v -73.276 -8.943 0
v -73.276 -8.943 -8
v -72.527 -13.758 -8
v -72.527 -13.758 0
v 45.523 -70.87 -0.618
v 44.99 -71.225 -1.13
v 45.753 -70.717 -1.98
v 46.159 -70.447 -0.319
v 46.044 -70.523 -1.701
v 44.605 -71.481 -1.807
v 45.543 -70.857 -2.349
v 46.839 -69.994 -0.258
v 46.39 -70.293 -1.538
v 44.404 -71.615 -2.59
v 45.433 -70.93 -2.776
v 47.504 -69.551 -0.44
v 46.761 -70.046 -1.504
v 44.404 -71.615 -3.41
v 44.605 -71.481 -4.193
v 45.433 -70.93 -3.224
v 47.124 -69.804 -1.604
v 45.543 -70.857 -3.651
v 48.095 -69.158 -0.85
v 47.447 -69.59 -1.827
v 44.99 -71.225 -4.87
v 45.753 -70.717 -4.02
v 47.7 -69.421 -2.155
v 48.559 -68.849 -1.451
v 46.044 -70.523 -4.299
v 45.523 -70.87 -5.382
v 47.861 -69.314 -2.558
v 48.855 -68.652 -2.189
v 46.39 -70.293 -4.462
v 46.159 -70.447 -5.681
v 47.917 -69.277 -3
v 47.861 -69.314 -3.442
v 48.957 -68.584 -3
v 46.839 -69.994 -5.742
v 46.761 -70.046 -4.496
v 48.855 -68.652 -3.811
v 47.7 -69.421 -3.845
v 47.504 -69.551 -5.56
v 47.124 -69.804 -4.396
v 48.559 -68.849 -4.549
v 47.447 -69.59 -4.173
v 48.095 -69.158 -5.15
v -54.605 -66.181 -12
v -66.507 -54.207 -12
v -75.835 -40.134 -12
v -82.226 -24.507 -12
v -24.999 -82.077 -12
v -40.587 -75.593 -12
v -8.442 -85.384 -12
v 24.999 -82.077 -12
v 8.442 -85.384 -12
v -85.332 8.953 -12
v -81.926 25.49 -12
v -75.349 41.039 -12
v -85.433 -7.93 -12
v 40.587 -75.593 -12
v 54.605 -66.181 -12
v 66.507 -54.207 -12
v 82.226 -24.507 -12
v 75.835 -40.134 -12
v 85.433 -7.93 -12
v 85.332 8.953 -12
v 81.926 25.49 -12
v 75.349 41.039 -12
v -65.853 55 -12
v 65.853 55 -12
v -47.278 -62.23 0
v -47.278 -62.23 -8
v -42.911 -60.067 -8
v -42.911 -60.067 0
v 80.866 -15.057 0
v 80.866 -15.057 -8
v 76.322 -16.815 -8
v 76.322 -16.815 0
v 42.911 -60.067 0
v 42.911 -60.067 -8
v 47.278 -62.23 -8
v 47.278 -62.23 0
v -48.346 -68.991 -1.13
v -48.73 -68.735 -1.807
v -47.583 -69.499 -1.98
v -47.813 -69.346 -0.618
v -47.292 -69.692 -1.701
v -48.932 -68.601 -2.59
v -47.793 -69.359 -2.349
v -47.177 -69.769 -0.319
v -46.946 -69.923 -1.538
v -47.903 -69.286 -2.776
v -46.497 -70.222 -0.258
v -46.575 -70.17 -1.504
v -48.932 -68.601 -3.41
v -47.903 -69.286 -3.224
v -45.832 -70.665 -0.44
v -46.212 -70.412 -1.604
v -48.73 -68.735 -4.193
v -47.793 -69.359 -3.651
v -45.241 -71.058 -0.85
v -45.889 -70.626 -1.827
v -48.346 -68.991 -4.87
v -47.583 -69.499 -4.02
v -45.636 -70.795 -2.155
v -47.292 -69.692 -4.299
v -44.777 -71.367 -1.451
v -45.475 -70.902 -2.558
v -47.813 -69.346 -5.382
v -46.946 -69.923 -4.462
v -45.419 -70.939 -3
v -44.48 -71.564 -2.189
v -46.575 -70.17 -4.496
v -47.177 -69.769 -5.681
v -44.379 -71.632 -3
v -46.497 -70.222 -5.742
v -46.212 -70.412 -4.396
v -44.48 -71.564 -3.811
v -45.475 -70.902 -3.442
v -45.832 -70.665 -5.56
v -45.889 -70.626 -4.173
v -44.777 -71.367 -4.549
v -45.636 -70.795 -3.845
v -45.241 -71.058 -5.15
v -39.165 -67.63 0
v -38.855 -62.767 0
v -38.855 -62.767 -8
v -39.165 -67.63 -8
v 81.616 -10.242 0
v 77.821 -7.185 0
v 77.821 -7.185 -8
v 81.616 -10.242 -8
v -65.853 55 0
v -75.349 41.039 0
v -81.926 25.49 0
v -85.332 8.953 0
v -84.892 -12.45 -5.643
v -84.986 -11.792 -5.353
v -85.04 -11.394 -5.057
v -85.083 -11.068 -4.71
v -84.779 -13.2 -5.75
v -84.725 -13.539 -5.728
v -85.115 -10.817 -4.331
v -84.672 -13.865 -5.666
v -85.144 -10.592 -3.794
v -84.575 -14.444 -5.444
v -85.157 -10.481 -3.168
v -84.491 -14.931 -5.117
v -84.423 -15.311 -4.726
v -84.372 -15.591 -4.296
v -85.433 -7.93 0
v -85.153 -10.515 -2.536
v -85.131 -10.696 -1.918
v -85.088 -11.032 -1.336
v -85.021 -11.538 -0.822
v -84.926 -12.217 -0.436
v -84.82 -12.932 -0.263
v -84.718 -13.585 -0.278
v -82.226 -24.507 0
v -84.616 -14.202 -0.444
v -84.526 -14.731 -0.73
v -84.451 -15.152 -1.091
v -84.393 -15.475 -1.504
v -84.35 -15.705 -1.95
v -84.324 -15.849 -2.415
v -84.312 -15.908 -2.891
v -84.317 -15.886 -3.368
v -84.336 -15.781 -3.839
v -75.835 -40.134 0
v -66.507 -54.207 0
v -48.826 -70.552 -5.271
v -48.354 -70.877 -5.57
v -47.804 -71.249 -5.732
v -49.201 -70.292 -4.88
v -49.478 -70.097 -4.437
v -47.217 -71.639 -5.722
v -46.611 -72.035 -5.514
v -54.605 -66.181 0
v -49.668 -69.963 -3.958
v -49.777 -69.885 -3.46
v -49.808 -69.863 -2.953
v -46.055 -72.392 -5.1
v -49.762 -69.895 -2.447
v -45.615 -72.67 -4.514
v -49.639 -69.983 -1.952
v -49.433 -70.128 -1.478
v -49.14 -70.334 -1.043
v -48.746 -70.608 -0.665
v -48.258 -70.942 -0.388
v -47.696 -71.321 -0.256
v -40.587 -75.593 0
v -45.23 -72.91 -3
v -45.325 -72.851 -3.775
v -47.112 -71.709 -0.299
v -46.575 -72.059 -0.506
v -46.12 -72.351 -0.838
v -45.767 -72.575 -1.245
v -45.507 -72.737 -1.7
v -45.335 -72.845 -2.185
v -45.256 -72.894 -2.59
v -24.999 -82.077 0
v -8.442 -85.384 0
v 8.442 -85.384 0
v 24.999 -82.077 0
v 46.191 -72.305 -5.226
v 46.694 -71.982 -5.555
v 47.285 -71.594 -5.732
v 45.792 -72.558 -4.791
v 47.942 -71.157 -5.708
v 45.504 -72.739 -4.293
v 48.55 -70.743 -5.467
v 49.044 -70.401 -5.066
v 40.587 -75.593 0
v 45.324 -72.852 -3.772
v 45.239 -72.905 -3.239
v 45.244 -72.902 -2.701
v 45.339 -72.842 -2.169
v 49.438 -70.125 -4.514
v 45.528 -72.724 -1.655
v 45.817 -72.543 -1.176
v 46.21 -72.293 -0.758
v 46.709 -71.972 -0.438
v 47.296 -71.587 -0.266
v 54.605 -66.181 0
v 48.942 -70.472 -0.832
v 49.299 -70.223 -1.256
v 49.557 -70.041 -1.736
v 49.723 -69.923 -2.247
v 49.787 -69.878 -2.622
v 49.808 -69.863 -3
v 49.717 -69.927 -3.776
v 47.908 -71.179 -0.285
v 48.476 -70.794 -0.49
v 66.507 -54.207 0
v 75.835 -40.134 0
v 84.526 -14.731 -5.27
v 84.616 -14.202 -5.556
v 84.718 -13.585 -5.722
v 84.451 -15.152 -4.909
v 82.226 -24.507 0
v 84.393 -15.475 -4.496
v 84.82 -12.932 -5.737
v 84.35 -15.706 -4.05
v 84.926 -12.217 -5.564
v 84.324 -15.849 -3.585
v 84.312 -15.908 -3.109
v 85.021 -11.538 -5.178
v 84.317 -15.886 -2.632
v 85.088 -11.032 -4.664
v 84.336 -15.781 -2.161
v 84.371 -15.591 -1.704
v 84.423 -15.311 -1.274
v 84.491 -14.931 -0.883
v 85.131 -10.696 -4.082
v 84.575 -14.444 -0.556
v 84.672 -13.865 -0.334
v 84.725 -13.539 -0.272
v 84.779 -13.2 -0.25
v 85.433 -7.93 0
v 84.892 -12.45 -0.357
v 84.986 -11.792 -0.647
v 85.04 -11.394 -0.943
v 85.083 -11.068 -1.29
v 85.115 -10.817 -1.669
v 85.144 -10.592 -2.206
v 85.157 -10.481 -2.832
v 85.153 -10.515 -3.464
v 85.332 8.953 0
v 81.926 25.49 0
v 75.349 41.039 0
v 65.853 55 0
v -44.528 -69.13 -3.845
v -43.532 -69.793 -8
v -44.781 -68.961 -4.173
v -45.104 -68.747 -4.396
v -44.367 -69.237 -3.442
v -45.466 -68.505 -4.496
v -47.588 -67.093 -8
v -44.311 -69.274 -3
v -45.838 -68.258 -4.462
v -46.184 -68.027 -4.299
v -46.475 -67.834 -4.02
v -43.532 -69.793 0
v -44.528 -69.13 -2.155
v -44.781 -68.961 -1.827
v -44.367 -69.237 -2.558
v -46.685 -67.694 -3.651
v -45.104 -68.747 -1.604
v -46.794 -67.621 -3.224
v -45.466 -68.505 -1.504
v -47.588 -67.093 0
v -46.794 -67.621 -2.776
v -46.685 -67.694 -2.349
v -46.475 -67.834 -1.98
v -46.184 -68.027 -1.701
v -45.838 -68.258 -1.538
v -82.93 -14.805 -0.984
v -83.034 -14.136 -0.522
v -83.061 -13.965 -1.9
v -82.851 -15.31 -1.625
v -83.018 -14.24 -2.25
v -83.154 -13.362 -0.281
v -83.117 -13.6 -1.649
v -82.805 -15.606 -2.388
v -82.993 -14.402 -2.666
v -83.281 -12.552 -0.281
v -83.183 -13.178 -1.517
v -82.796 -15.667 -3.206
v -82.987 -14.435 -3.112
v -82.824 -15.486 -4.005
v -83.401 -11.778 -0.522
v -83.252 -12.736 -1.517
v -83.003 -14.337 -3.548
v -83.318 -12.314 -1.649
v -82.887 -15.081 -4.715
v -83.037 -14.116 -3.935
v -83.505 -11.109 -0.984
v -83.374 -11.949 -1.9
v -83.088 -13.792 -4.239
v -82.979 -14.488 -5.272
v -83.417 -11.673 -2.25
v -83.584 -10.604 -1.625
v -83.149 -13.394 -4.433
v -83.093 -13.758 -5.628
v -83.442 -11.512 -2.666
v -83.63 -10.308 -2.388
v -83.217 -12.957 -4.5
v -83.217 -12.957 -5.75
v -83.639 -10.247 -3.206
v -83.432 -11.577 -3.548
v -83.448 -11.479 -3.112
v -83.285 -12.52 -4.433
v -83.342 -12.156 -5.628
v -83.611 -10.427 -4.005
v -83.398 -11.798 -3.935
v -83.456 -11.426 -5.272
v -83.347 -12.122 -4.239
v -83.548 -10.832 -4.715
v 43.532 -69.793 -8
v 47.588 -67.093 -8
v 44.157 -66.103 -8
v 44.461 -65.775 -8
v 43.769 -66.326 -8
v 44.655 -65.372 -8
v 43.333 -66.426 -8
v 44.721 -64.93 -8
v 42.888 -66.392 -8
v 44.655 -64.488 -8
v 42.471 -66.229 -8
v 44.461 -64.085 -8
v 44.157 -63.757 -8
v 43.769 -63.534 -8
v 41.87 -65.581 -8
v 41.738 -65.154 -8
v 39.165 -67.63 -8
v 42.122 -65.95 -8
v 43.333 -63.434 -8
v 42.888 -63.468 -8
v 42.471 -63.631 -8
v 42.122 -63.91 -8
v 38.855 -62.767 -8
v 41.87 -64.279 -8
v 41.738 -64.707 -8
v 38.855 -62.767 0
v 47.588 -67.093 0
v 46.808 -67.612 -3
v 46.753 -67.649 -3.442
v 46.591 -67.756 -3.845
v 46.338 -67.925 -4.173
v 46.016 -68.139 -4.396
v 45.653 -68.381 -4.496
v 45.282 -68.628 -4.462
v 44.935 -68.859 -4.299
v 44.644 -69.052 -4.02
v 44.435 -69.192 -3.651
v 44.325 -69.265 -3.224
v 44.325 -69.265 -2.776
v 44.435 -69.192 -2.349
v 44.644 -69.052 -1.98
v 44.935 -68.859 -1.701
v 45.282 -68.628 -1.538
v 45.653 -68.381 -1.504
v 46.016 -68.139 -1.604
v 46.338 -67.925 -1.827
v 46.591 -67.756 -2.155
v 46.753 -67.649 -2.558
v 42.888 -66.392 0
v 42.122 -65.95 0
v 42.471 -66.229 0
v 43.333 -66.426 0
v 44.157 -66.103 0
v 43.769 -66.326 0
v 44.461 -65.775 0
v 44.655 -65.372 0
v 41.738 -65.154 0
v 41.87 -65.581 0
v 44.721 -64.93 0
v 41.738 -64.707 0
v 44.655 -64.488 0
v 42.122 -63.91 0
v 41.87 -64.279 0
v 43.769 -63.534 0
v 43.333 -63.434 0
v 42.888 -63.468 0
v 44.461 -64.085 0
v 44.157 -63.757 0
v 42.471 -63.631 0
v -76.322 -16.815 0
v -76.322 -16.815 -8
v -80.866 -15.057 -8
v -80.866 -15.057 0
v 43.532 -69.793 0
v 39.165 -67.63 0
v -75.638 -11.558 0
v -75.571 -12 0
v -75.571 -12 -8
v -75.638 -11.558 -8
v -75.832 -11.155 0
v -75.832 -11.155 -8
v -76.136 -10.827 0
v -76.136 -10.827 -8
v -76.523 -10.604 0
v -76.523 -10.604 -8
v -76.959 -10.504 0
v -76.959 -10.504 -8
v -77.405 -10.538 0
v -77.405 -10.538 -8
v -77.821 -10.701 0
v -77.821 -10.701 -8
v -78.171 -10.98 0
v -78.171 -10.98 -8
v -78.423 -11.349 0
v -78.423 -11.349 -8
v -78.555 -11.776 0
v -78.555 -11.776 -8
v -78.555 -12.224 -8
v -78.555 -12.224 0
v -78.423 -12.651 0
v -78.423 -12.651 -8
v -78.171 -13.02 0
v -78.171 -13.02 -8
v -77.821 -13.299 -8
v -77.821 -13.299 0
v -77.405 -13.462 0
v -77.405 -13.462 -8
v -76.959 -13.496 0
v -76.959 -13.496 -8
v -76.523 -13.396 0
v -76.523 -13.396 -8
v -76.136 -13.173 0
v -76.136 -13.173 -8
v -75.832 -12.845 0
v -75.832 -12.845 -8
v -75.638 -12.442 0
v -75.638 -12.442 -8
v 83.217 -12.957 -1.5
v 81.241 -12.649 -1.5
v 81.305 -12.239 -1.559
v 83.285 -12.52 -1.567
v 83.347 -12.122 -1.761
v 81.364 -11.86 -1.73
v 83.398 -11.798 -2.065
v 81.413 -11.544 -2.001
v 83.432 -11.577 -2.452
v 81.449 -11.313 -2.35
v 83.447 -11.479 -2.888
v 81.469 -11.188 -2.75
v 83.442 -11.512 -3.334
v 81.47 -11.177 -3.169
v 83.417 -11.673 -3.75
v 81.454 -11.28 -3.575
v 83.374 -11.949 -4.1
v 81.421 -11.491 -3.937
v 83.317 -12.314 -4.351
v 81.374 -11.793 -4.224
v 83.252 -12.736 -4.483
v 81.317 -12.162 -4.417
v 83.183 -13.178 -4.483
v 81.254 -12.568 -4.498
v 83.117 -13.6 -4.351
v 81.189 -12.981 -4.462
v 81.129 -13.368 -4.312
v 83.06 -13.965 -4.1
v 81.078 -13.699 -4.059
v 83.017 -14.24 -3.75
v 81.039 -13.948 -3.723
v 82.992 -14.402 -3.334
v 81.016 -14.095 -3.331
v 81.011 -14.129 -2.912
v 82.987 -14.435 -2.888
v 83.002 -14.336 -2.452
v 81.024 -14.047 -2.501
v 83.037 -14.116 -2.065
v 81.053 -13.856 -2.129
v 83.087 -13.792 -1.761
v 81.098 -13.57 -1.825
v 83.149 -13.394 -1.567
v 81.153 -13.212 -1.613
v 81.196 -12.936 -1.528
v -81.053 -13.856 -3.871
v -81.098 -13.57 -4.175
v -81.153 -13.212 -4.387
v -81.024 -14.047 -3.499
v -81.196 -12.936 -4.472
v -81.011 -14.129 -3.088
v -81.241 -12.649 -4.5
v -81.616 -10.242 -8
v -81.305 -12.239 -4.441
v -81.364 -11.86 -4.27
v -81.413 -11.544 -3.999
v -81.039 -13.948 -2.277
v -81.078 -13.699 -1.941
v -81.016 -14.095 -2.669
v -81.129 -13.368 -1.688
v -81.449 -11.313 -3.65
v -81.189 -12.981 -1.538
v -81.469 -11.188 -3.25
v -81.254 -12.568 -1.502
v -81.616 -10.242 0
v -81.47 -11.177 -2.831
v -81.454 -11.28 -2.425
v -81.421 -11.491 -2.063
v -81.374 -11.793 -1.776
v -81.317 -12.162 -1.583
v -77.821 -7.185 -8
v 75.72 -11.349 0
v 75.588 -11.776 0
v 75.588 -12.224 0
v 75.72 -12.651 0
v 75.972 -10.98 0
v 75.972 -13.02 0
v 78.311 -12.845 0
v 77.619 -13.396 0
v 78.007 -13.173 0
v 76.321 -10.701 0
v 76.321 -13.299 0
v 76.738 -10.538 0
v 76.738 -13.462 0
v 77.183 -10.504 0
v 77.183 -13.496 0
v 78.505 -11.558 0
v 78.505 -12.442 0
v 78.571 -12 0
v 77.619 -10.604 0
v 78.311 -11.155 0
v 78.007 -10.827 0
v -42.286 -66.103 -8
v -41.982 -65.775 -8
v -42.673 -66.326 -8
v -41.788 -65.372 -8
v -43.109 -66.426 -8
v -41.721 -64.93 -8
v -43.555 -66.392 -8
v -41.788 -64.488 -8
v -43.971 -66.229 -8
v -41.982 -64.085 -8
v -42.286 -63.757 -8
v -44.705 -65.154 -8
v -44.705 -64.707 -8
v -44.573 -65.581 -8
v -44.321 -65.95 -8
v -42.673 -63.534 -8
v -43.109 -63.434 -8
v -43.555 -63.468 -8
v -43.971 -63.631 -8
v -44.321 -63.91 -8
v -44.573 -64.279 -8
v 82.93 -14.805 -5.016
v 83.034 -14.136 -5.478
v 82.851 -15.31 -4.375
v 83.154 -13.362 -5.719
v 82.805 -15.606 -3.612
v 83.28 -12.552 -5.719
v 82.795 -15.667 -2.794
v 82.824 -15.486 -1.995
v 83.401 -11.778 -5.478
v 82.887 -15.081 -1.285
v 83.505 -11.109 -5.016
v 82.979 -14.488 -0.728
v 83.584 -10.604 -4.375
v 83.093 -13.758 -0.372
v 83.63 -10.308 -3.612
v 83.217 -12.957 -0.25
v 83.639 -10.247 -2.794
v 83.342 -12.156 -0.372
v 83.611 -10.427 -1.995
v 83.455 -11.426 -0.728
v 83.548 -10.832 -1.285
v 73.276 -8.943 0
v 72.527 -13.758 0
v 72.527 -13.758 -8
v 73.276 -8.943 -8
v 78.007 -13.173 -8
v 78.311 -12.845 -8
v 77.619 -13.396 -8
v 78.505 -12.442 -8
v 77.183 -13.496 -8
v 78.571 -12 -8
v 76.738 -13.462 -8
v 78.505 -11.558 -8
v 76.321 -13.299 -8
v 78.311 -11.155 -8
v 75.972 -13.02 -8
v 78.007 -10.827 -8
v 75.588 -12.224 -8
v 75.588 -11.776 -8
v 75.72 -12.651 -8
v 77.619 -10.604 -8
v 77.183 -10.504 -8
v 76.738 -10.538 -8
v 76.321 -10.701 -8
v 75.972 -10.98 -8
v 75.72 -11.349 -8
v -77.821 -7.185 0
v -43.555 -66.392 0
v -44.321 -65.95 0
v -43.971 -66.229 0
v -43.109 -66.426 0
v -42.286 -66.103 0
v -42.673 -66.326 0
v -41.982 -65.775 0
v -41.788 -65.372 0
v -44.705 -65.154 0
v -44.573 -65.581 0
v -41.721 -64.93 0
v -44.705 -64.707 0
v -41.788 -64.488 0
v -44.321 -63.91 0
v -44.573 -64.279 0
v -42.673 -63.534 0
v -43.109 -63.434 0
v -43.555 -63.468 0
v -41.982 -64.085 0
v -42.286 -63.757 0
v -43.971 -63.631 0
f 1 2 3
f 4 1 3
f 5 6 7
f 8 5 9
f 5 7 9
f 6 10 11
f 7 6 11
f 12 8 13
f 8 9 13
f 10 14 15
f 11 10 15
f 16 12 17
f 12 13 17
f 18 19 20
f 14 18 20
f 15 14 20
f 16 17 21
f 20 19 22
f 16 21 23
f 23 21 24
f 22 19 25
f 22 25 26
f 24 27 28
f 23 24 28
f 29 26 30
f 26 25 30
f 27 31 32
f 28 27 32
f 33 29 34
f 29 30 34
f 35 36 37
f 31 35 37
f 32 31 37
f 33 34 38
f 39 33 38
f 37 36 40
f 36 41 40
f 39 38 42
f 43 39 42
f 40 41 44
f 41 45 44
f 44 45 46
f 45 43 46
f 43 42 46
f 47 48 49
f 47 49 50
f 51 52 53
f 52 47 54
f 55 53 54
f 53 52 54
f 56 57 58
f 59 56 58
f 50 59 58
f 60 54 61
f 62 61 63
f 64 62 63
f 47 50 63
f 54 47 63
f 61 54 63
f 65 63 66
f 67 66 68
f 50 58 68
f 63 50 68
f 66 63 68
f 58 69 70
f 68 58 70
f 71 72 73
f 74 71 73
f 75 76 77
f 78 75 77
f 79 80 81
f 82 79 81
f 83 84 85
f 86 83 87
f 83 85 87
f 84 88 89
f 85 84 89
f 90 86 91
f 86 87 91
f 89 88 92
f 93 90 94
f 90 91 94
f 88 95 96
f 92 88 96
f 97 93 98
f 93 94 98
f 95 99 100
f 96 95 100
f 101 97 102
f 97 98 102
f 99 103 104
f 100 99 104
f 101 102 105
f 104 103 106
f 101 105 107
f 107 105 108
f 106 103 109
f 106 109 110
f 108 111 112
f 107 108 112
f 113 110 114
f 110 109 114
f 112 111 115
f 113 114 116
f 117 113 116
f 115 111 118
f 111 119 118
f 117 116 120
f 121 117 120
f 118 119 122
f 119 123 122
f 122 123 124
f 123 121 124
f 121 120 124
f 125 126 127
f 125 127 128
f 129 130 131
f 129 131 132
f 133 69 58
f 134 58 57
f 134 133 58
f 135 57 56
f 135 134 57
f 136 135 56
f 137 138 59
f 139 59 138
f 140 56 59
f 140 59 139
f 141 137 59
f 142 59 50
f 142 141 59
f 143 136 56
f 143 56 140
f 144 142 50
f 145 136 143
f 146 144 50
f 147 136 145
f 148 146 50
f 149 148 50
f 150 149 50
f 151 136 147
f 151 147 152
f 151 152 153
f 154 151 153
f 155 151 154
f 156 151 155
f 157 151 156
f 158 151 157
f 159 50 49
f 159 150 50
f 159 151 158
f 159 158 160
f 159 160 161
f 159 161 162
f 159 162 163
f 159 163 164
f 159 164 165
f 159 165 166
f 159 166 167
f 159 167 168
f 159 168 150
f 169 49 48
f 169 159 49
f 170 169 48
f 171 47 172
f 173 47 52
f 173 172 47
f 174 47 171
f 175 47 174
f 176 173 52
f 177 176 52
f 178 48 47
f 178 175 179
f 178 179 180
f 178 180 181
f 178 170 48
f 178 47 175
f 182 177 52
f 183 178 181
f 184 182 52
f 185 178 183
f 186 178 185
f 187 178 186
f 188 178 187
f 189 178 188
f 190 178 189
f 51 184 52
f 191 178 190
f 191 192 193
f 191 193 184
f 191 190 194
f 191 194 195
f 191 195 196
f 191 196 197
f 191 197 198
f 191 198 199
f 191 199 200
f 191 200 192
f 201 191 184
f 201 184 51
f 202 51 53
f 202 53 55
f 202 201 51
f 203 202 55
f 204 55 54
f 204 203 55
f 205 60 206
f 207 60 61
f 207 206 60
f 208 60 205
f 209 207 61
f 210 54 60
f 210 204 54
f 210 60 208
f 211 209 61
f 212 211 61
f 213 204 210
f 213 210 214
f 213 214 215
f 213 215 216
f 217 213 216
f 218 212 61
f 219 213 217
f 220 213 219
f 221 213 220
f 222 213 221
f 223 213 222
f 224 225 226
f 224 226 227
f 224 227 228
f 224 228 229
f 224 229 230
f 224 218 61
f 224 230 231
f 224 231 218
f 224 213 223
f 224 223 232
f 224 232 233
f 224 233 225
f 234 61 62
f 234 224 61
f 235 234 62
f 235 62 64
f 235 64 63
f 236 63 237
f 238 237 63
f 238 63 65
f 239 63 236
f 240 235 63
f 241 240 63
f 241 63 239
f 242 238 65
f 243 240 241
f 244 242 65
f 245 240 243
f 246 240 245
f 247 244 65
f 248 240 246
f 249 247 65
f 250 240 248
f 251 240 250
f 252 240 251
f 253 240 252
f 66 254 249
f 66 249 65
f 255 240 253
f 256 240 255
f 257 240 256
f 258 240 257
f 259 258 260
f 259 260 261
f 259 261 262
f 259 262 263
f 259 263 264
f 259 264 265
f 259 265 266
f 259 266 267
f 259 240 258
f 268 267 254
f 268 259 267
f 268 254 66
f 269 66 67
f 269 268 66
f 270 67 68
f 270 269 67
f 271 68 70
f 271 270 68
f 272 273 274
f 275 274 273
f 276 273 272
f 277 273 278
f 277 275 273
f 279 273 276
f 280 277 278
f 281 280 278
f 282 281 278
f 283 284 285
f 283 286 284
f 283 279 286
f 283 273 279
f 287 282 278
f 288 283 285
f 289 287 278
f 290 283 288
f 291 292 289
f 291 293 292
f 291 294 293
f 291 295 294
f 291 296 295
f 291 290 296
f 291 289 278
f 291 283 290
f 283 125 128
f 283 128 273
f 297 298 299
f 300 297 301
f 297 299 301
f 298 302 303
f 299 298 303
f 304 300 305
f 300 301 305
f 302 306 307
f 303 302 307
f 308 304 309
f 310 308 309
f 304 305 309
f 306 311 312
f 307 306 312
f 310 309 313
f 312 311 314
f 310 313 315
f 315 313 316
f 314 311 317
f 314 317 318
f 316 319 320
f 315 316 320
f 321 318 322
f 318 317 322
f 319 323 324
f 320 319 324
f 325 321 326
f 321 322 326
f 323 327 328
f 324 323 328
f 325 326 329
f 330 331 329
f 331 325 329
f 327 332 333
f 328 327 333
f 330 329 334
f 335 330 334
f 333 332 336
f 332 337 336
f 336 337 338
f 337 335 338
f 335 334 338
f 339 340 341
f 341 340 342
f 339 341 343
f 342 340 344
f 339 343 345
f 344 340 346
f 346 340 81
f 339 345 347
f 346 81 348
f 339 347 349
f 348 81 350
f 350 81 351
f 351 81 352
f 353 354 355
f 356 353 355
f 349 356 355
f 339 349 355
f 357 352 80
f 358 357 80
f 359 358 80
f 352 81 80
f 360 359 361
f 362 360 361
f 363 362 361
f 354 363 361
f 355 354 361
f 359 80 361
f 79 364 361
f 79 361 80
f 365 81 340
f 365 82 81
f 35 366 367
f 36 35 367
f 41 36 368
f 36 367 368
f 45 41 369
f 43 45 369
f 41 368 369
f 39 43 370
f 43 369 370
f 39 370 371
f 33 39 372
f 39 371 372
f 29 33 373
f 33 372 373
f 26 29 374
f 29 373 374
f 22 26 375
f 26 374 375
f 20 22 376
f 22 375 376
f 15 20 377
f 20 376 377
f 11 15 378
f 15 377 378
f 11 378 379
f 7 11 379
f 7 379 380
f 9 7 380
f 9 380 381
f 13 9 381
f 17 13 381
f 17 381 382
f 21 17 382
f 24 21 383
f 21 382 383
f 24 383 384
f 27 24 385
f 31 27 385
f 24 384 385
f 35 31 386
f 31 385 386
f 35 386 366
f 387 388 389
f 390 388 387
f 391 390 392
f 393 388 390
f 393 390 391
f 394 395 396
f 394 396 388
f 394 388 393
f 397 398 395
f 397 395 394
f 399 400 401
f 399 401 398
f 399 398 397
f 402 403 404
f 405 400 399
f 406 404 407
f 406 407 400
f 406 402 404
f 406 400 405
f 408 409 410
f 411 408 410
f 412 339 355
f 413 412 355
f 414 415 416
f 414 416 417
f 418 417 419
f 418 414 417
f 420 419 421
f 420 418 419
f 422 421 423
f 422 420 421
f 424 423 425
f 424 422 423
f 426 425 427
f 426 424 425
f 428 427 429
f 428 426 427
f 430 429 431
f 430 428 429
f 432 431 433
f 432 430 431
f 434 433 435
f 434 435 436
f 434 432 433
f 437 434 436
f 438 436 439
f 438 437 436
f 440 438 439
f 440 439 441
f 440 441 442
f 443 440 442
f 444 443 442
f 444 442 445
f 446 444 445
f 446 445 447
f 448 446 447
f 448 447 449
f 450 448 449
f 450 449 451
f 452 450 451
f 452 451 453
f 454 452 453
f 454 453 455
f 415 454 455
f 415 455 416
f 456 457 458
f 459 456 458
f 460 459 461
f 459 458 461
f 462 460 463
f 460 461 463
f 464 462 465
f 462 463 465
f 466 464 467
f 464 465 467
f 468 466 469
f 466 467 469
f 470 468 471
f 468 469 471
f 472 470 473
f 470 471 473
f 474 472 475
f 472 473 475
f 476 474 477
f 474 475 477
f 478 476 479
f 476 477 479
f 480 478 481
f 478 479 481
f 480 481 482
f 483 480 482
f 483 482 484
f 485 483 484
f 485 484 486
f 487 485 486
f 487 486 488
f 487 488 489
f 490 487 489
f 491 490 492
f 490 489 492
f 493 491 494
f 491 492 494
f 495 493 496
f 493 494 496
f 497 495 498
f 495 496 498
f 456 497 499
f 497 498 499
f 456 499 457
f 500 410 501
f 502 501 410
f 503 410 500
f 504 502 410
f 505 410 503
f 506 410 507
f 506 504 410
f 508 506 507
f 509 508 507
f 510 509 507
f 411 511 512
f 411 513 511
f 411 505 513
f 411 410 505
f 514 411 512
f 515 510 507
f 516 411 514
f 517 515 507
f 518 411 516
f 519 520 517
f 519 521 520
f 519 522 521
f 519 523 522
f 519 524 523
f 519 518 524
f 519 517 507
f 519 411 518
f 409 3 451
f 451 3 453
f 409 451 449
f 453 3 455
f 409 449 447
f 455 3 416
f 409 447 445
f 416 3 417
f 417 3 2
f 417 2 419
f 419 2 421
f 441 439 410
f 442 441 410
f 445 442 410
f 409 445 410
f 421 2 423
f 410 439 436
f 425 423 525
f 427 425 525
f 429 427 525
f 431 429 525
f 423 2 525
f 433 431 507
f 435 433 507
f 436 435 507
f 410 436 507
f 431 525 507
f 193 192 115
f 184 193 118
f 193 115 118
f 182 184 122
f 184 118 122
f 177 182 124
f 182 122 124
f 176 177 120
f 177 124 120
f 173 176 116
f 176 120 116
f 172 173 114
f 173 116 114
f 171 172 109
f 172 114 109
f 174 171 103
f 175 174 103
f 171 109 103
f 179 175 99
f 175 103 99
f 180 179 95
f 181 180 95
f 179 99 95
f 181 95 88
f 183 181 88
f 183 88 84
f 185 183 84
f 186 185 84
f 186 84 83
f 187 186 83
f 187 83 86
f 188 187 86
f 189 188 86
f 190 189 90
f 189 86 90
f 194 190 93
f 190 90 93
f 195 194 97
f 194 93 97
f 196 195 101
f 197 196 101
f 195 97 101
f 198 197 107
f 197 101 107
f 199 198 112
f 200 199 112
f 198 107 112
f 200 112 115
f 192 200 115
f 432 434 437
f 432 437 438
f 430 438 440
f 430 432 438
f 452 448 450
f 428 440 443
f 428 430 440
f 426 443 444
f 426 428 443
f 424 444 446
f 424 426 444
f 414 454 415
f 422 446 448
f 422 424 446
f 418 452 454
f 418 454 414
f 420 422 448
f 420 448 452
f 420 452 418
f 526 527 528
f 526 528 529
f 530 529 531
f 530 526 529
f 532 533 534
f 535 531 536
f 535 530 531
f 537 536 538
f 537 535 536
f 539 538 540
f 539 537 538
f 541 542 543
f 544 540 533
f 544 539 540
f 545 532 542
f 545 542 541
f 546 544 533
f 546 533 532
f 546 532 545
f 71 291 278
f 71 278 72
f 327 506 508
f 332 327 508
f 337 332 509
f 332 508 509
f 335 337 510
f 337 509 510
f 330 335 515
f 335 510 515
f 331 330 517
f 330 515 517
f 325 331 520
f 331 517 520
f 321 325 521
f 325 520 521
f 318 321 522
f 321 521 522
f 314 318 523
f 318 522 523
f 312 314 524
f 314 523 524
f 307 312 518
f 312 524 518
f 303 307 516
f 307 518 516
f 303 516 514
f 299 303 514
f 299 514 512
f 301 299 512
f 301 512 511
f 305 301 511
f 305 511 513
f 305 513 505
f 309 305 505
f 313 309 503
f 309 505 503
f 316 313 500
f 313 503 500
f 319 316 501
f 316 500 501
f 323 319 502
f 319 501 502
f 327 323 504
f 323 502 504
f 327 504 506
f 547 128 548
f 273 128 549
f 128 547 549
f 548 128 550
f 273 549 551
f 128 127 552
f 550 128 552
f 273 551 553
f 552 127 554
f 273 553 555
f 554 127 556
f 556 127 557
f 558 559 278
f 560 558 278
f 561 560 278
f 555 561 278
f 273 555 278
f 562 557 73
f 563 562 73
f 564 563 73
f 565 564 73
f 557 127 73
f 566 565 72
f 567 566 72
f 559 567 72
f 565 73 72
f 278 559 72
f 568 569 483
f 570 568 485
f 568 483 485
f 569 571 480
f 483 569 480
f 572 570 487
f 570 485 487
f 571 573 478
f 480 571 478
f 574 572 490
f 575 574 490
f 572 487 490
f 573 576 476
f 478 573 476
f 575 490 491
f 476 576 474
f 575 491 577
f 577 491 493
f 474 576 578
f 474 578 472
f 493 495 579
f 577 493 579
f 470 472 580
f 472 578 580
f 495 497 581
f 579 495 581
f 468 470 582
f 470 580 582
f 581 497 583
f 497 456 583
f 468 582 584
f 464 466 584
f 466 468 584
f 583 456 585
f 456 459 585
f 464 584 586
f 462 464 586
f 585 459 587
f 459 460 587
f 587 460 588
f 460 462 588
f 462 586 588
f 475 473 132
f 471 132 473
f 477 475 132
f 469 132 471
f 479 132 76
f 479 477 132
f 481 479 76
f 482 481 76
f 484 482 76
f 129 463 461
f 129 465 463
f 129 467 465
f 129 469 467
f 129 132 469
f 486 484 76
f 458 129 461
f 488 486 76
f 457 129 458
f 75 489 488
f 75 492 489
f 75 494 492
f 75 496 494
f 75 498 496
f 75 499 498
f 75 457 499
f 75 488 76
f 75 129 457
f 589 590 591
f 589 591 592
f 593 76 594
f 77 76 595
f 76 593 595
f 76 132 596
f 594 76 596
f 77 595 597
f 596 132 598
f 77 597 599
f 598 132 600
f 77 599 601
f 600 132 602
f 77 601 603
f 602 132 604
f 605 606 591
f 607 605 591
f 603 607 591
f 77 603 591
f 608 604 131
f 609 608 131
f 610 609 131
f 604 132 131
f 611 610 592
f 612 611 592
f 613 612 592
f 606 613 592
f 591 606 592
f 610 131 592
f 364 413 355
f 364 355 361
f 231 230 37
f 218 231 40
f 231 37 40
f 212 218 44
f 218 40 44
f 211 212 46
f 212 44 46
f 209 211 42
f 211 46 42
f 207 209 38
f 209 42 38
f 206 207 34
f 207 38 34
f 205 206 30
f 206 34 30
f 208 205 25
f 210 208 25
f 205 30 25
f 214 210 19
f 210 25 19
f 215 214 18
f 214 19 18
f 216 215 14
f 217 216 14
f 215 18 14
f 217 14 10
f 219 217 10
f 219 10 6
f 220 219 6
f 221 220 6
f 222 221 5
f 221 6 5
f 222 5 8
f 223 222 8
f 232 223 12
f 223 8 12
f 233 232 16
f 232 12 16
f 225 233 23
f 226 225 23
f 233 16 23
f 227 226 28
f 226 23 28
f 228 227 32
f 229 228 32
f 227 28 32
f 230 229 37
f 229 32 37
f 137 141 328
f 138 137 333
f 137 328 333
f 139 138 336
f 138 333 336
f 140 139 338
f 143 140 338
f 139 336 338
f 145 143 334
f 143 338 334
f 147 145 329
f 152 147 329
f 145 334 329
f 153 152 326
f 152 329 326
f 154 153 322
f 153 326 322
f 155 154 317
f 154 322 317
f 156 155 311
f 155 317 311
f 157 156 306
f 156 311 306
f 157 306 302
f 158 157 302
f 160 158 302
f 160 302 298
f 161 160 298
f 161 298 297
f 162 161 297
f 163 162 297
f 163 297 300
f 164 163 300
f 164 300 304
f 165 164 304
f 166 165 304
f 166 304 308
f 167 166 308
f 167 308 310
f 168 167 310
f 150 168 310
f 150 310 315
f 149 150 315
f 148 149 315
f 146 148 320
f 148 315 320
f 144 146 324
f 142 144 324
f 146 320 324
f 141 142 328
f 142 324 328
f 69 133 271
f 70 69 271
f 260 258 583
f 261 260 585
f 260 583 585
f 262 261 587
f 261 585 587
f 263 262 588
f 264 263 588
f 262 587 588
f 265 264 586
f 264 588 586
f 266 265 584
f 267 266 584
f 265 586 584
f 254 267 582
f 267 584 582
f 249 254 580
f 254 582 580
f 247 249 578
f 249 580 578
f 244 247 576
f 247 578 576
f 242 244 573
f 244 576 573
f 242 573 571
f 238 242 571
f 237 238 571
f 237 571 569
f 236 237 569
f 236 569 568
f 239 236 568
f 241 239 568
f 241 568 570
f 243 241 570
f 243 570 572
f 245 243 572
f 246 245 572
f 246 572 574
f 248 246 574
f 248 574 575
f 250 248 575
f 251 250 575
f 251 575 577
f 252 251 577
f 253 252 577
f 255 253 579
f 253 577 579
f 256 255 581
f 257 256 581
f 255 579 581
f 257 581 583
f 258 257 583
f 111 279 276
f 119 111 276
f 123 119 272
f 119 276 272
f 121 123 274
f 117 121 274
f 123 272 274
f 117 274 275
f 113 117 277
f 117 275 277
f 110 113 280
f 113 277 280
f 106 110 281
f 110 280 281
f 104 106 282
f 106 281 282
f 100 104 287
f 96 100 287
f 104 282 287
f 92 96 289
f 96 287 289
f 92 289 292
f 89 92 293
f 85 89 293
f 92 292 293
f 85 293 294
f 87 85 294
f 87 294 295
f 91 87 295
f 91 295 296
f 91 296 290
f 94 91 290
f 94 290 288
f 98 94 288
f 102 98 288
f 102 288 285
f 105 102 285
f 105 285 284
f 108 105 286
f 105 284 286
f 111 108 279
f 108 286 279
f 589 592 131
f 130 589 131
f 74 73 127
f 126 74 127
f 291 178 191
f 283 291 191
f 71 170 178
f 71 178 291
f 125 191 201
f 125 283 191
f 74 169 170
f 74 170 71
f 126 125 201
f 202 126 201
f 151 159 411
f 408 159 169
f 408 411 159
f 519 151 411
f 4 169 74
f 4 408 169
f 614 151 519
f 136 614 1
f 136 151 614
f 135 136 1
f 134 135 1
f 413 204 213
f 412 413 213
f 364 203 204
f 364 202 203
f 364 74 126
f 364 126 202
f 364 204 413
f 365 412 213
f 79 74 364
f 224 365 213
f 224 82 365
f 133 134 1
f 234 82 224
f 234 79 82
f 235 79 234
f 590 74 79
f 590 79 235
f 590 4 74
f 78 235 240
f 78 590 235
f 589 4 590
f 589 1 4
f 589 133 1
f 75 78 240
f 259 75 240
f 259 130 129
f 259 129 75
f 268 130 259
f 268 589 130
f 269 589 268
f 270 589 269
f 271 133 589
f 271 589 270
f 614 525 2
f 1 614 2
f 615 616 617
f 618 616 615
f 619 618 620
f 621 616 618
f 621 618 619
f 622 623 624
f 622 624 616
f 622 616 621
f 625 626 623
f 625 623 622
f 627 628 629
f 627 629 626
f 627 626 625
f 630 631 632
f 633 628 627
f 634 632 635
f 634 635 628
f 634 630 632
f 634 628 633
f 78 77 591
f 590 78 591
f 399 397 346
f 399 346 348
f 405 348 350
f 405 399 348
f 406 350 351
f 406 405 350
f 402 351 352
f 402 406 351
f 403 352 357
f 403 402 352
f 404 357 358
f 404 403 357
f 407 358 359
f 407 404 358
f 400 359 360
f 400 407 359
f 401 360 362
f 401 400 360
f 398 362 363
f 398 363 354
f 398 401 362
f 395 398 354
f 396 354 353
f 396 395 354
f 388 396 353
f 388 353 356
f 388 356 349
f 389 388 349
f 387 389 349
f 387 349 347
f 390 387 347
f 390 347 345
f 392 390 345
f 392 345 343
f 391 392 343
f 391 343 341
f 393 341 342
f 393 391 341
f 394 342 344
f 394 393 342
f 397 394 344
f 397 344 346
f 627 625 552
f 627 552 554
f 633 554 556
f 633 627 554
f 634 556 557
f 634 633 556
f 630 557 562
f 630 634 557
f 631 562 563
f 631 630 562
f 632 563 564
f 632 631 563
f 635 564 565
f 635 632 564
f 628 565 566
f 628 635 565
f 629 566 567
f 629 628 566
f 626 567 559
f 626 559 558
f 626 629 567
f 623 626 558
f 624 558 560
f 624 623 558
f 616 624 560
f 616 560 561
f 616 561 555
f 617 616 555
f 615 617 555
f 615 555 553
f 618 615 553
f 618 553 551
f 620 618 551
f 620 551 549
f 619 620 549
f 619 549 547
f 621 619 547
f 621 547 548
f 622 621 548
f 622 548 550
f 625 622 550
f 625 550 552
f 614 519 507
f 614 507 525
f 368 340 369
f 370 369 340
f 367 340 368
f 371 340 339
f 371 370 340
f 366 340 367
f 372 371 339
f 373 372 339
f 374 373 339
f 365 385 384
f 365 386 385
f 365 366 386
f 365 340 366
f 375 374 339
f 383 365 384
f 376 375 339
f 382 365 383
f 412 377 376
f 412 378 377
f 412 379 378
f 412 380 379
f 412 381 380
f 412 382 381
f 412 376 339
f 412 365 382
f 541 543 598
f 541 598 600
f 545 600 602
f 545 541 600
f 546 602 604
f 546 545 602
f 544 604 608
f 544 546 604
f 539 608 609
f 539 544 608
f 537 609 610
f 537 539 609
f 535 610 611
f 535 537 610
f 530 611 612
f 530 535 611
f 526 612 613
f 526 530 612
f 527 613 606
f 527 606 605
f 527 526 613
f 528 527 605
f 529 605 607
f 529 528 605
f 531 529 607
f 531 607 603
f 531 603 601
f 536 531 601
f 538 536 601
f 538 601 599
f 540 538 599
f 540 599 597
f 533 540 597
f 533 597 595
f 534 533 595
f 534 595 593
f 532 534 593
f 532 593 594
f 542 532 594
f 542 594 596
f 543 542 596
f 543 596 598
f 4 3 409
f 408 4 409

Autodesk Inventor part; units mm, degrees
sketch "Sketch1" plane through (0, 0, 0) normal (0, 0, 1) x (1, 0, 0)
  circle A0 centre (0, 0) radius 85.8
  line L0 (-72.5268, -13.7582) -> (-76.3217, -16.8148)
  line L1 (-76.3217, -16.8148) -> (-80.8663, -15.0566)
  line L2 (-80.8663, -15.0566) -> (-81.616, -10.2418)
  line L3 (-81.616, -10.2418) -> (-77.8211, -7.1852)
  line L4 (-77.8211, -7.1852) -> (-73.2765, -8.9434)
  line L5 (-73.2765, -8.9434) -> (-72.5268, -13.7582)
  line L6 (73.2765, -8.9434) -> (77.8211, -7.1852)
  line L7 (77.8211, -7.1852) -> (81.616, -10.2418)
  line L8 (81.616, -10.2418) -> (80.8663, -15.0566)
  line L9 (80.8663, -15.0566) -> (76.3217, -16.8148)
  line L10 (76.3217, -16.8148) -> (72.5268, -13.7582)
  line L11 (72.5268, -13.7582) -> (73.2765, -8.9434)
  line L12 (-77.0714, -12) -> (0, 0) construction
  line L13 (77.0714, -12) -> (0, 0) construction
  line L14 (0, 0) -> (85.8, 0) construction
  line L15 (47.5879, -67.0929) -> (43.5316, -69.793)
  line L16 (47.2777, -62.2299) -> (47.5879, -67.0929)
  line L17 (42.9111, -60.0671) -> (47.2777, -62.2299)
  line L18 (38.8548, -62.7673) -> (42.9111, -60.0671)
  line L19 (39.165, -67.6302) -> (38.8548, -62.7673)
  line L20 (43.5316, -69.793) -> (39.165, -67.6302)
  line L21 (-47.2777, -62.2299) -> (-42.9111, -60.0671)
  line L22 (-42.9111, -60.0671) -> (-38.8548, -62.7673)
  line L23 (-38.8548, -62.7673) -> (-39.165, -67.6302)
  line L24 (-39.165, -67.6302) -> (-43.5316, -69.793)
  line L25 (-43.5316, -69.793) -> (-47.5879, -67.0929)
  line L26 (-47.5879, -67.0929) -> (-47.2777, -62.2299)
  line L27 (-65.8532, 55) -> (65.8532, 55)
  circle A1 centre (77.0714, -12) radius 1.5
  circle A2 centre (43.2214, -64.9301) radius 1.5
  circle A3 centre (-43.2214, -64.9301) radius 1.5
  circle A4 centre (-77.0714, -12) radius 1.5
  dimension "d0" = 171.6
  dimension "d1" = 78
  dimension "d2" = 78
  dimension "d5" = 12
  dimension "d6" = 4.22
  dimension "d7" = 4.22
  dimension "d10" = 12
  dimension "d13" = 47.5
  dimension "d17" = 47.5
  dimension "d19" = 55
  dimension "d81" = 3
  dimension "d82" = 3
  dimension "d83" = 3
  dimension "d84" = 3
extrude "Extrusion1" add sketch "Sketch1" against normal blind 12 contours A0 L27 | A1 | A2 | A3 | A4 picked at (21.9511, 12.3711)
sketch "Sketch2" plane through (0, 0, -12) normal (0, 0, -1) x (-1, 0, 0)
  arc A0 (-65.8532, 55) -> (65.8532, 55) centre (0, 0) ccw projected
  line L0 (65.8532, 55) -> (-65.8532, 55) projected
  line L1 (76.3217, -16.8148) -> (72.5268, -13.7582) projected
  line L2 (72.5268, -13.7582) -> (73.2765, -8.9434) projected
  line L3 (73.2765, -8.9434) -> (77.8211, -7.1852) projected
  line L4 (77.8211, -7.1852) -> (81.616, -10.2418) projected
  line L5 (81.616, -10.2418) -> (80.8663, -15.0566) projected
  line L6 (80.8663, -15.0566) -> (76.3217, -16.8148) projected
  line L7 (-77.8211, -7.1852) -> (-73.2765, -8.9434) projected
  line L8 (-73.2765, -8.9434) -> (-72.5268, -13.7582) projected
  line L9 (-72.5268, -13.7582) -> (-76.3217, -16.8148) projected
  line L10 (-76.3217, -16.8148) -> (-80.8663, -15.0566) projected
  line L11 (-80.8663, -15.0566) -> (-81.616, -10.2418) projected
  line L12 (-81.616, -10.2418) -> (-77.8211, -7.1852) projected
  line L13 (-43.5316, -69.793) -> (-47.5879, -67.0929) projected
  line L14 (-47.5879, -67.0929) -> (-47.2777, -62.2299) projected
  line L15 (-47.2777, -62.2299) -> (-42.9111, -60.0671) projected
  line L16 (-42.9111, -60.0671) -> (-38.8548, -62.7673) projected
  line L17 (-38.8548, -62.7673) -> (-39.165, -67.6302) projected
  line L18 (-39.165, -67.6302) -> (-43.5316, -69.793) projected
  line L19 (42.9111, -60.0671) -> (47.2777, -62.2299) projected
  line L20 (47.2777, -62.2299) -> (47.5879, -67.0929) projected
  line L21 (47.5879, -67.0929) -> (43.5316, -69.793) projected
  line L22 (43.5316, -69.793) -> (39.165, -67.6302) projected
  line L23 (39.165, -67.6302) -> (38.8548, -62.7673) projected
  line L24 (38.8548, -62.7673) -> (42.9111, -60.0671) projected
extrude "Extrusion2" add sketch "Sketch2" against normal blind 4 contours L1 L2 L3 L4 L5 L6 | L7 L8 L9 L10 L11 L12 | L13 L14 L15 L16 L17 L18 | L19 L20 L21 L22 L23 L24
sketch "Sketch3" plane through (80.8663, -15.0566, -8) normal (-0.9881, 0.1538, 0) x (0, 0, 1)
  line L0 (0, 4.8728) -> (0, 0) projected
  line L1 (8, 0) -> (0, 0) projected
  line L2 (8, 4.8728) -> (8, 0) projected
  line L3 (8, 4.8728) -> (0, 4.8728) projected
  circle A0 centre (5, 2.4364) radius 1.5
  point P0 (8, 2.4364)
  dimension "d24" = 3
  dimension "d26" = 5
  dimension "d27" = 2.4364
extrude "Extrusion3" cut sketch "Sketch3" against normal blind 5 contours A0
sketch "Sketch4" plane through (43.5316, -69.793, 0) normal (-0.5541, 0.8324, 0) x (0.8324, 0.5541, 0)
  line L0 (4.8728, 8) -> (0, 8) projected
  line L1 (0, 0) -> (0, 8) projected
  line L2 (4.8728, 0) -> (0, 0) projected
  line L3 (4.8728, 0) -> (4.8728, 8) projected
  circle A0 centre (2.4364, 3) radius 1.5
  point P0 (2.4364, 0)
  dimension "d30" = 3
  dimension "d31" = 5
  dimension "d32" = 2.4364
extrude "Extrusion4" cut sketch "Sketch4" against normal blind 5 contours A0
sketch "Sketch5" plane through (-47.5879, -67.0929, 0) normal (0.5541, 0.8324, 0) x (0.8324, -0.5541, 0)
  line L0 (4.8728, 8) -> (0, 8) projected
  line L1 (0, 0) -> (0, 8) projected
  line L2 (4.8728, 0) -> (0, 0) projected
  line L3 (4.8728, 0) -> (4.8728, 8) projected
  circle A0 centre (2.4364, 3) radius 1.5
  point P0 (2.4364, 0)
  dimension "d35" = 3
  dimension "d36" = 2.4364
  dimension "d37" = 5
extrude "Extrusion5" cut sketch "Sketch5" against normal blind 5 contours A0
sketch "Sketch6" plane through (-81.616, -10.2418, 0) normal (0.9881, 0.1538, 0) x (0, 0, -1)
  line L0 (8, -4.8728) -> (8, 0) projected
  line L1 (0, 0) -> (8, 0) projected
  line L2 (0, -4.8728) -> (0, 0) projected
  line L3 (0, -4.8728) -> (8, -4.8728) projected
  circle A0 centre (3, -2.4364) radius 1.5
  point P0 (0, -2.4364)
  dimension "d40" = 3
  dimension "d41" = 2.4364
  dimension "d42" = 5
extrude "Extrusion6" cut sketch "Sketch6" against normal blind 5 contours A0
ref_plane "Work Plane1" through (82.8425, -15.3643, -8) normal (-0.9881, 0.1538, 0) x (0, 0, 1)
sketch "Sketch7" plane through (82.8425, -15.3643, -8) normal (-0.9881, 0.1538, 0) x (0, 0, 1)
  circle A0 centre (5, 2.4364) radius 1.5 projected
  circle A1 centre (5, 2.4364) radius 2.75
  point P0 (8, 2.4364)
  dimension "d46" = 5.5
extrude "Extrusion7" cut sketch "Sketch7" against normal up to surface contours A0 | A1
ref_plane "Work Plane2" through (44.6398, -71.4579, 0) normal (-0.5541, 0.8324, 0) x (0.8324, 0.5541, 0)
sketch "Sketch8" plane through (44.6398, -71.4579, 0) normal (-0.5541, 0.8324, 0) x (0.8324, 0.5541, 0)
  circle A0 centre (2.4364, 3) radius 1.5 projected
  circle A1 centre (2.4364, 3) radius 2.75
  point P0 (2.4364, 0)
  dimension "d50" = 5.5
extrude "Extrusion8" cut sketch "Sketch8" against normal up to surface contours A0 | A1
ref_plane "Work Plane3" through (-48.6961, -68.7578, 0) normal (0.5541, 0.8324, 0) x (0.8324, -0.5541, 0)
sketch "Sketch9" plane through (-48.6961, -68.7578, 0) normal (0.5541, 0.8324, 0) x (0.8324, -0.5541, 0)
  circle A0 centre (2.4364, 3) radius 1.5 projected
  circle A1 centre (2.4364, 3) radius 2.75
  point P0 (2.4364, 0)
  dimension "d54" = 5.5
extrude "Extrusion9" cut sketch "Sketch9" against normal up to surface contours A0 | A1
ref_plane "Work Plane4" through (-83.5922, -10.5495, 0) normal (0.9881, 0.1538, 0) x (0, 0, -1)
sketch "Sketch10" plane through (-83.5922, -10.5495, 0) normal (0.9881, 0.1538, 0) x (0, 0, -1)
  circle A0 centre (3, -2.4364) radius 1.5 projected
  circle A1 centre (3, -2.4364) radius 2.75
  point P0 (0, -2.4364)
  dimension "d58" = 5.5
extrude "Extrusion10" cut sketch "Sketch10" against normal up to surface contours A0 | A1
sketch "Sketch11" plane through (0, 0, -12) normal (0, 0, -1) x (-1, 0, 0)
  line L0 (75.3409, 34.7165) -> (17.3409, 34.7165) construction
  line L1 (17.3409, 34.7165) -> (17.3409, -14.2835) construction
  line L2 (17.3409, -14.2835) -> (75.3409, -14.2835) construction
  line L3 (75.3409, -14.2835) -> (75.3409, 34.7165) construction
  circle A0 centre (75.3409, 34.7165) radius 1.5
  circle A1 centre (75.3409, -14.2835) radius 1.5
  circle A2 centre (17.3409, 34.7165) radius 1.5
  circle A3 centre (17.3409, -14.2835) radius 1.5
  line L4 (59.7604, -34.3641) -> (1.7604, -34.3641) construction
  line L5 (1.7604, -34.3641) -> (1.7604, -57.3641) construction
  line L6 (1.7604, -57.3641) -> (59.7604, -57.3641) construction
  line L7 (59.7604, -57.3641) -> (59.7604, -34.3641) construction
  circle A4 centre (59.7604, -34.3641) radius 1.5
  circle A5 centre (59.7604, -57.3641) radius 1.5
  circle A6 centre (1.7604, -57.3641) radius 1.5
  circle A7 centre (1.7604, -34.3641) radius 1.5
  dimension "d69" = 58
  dimension "d70" = 49
  dimension "d71" = 3
  dimension "d72" = 3
  dimension "d73" = 3
  dimension "d74" = 3
  dimension "d75" = 58
  dimension "d76" = 23
  dimension "d77" = 3
  dimension "d78" = 3
  dimension "d79" = 3
  dimension "d80" = 3
properties part number "plate_third_floor"
